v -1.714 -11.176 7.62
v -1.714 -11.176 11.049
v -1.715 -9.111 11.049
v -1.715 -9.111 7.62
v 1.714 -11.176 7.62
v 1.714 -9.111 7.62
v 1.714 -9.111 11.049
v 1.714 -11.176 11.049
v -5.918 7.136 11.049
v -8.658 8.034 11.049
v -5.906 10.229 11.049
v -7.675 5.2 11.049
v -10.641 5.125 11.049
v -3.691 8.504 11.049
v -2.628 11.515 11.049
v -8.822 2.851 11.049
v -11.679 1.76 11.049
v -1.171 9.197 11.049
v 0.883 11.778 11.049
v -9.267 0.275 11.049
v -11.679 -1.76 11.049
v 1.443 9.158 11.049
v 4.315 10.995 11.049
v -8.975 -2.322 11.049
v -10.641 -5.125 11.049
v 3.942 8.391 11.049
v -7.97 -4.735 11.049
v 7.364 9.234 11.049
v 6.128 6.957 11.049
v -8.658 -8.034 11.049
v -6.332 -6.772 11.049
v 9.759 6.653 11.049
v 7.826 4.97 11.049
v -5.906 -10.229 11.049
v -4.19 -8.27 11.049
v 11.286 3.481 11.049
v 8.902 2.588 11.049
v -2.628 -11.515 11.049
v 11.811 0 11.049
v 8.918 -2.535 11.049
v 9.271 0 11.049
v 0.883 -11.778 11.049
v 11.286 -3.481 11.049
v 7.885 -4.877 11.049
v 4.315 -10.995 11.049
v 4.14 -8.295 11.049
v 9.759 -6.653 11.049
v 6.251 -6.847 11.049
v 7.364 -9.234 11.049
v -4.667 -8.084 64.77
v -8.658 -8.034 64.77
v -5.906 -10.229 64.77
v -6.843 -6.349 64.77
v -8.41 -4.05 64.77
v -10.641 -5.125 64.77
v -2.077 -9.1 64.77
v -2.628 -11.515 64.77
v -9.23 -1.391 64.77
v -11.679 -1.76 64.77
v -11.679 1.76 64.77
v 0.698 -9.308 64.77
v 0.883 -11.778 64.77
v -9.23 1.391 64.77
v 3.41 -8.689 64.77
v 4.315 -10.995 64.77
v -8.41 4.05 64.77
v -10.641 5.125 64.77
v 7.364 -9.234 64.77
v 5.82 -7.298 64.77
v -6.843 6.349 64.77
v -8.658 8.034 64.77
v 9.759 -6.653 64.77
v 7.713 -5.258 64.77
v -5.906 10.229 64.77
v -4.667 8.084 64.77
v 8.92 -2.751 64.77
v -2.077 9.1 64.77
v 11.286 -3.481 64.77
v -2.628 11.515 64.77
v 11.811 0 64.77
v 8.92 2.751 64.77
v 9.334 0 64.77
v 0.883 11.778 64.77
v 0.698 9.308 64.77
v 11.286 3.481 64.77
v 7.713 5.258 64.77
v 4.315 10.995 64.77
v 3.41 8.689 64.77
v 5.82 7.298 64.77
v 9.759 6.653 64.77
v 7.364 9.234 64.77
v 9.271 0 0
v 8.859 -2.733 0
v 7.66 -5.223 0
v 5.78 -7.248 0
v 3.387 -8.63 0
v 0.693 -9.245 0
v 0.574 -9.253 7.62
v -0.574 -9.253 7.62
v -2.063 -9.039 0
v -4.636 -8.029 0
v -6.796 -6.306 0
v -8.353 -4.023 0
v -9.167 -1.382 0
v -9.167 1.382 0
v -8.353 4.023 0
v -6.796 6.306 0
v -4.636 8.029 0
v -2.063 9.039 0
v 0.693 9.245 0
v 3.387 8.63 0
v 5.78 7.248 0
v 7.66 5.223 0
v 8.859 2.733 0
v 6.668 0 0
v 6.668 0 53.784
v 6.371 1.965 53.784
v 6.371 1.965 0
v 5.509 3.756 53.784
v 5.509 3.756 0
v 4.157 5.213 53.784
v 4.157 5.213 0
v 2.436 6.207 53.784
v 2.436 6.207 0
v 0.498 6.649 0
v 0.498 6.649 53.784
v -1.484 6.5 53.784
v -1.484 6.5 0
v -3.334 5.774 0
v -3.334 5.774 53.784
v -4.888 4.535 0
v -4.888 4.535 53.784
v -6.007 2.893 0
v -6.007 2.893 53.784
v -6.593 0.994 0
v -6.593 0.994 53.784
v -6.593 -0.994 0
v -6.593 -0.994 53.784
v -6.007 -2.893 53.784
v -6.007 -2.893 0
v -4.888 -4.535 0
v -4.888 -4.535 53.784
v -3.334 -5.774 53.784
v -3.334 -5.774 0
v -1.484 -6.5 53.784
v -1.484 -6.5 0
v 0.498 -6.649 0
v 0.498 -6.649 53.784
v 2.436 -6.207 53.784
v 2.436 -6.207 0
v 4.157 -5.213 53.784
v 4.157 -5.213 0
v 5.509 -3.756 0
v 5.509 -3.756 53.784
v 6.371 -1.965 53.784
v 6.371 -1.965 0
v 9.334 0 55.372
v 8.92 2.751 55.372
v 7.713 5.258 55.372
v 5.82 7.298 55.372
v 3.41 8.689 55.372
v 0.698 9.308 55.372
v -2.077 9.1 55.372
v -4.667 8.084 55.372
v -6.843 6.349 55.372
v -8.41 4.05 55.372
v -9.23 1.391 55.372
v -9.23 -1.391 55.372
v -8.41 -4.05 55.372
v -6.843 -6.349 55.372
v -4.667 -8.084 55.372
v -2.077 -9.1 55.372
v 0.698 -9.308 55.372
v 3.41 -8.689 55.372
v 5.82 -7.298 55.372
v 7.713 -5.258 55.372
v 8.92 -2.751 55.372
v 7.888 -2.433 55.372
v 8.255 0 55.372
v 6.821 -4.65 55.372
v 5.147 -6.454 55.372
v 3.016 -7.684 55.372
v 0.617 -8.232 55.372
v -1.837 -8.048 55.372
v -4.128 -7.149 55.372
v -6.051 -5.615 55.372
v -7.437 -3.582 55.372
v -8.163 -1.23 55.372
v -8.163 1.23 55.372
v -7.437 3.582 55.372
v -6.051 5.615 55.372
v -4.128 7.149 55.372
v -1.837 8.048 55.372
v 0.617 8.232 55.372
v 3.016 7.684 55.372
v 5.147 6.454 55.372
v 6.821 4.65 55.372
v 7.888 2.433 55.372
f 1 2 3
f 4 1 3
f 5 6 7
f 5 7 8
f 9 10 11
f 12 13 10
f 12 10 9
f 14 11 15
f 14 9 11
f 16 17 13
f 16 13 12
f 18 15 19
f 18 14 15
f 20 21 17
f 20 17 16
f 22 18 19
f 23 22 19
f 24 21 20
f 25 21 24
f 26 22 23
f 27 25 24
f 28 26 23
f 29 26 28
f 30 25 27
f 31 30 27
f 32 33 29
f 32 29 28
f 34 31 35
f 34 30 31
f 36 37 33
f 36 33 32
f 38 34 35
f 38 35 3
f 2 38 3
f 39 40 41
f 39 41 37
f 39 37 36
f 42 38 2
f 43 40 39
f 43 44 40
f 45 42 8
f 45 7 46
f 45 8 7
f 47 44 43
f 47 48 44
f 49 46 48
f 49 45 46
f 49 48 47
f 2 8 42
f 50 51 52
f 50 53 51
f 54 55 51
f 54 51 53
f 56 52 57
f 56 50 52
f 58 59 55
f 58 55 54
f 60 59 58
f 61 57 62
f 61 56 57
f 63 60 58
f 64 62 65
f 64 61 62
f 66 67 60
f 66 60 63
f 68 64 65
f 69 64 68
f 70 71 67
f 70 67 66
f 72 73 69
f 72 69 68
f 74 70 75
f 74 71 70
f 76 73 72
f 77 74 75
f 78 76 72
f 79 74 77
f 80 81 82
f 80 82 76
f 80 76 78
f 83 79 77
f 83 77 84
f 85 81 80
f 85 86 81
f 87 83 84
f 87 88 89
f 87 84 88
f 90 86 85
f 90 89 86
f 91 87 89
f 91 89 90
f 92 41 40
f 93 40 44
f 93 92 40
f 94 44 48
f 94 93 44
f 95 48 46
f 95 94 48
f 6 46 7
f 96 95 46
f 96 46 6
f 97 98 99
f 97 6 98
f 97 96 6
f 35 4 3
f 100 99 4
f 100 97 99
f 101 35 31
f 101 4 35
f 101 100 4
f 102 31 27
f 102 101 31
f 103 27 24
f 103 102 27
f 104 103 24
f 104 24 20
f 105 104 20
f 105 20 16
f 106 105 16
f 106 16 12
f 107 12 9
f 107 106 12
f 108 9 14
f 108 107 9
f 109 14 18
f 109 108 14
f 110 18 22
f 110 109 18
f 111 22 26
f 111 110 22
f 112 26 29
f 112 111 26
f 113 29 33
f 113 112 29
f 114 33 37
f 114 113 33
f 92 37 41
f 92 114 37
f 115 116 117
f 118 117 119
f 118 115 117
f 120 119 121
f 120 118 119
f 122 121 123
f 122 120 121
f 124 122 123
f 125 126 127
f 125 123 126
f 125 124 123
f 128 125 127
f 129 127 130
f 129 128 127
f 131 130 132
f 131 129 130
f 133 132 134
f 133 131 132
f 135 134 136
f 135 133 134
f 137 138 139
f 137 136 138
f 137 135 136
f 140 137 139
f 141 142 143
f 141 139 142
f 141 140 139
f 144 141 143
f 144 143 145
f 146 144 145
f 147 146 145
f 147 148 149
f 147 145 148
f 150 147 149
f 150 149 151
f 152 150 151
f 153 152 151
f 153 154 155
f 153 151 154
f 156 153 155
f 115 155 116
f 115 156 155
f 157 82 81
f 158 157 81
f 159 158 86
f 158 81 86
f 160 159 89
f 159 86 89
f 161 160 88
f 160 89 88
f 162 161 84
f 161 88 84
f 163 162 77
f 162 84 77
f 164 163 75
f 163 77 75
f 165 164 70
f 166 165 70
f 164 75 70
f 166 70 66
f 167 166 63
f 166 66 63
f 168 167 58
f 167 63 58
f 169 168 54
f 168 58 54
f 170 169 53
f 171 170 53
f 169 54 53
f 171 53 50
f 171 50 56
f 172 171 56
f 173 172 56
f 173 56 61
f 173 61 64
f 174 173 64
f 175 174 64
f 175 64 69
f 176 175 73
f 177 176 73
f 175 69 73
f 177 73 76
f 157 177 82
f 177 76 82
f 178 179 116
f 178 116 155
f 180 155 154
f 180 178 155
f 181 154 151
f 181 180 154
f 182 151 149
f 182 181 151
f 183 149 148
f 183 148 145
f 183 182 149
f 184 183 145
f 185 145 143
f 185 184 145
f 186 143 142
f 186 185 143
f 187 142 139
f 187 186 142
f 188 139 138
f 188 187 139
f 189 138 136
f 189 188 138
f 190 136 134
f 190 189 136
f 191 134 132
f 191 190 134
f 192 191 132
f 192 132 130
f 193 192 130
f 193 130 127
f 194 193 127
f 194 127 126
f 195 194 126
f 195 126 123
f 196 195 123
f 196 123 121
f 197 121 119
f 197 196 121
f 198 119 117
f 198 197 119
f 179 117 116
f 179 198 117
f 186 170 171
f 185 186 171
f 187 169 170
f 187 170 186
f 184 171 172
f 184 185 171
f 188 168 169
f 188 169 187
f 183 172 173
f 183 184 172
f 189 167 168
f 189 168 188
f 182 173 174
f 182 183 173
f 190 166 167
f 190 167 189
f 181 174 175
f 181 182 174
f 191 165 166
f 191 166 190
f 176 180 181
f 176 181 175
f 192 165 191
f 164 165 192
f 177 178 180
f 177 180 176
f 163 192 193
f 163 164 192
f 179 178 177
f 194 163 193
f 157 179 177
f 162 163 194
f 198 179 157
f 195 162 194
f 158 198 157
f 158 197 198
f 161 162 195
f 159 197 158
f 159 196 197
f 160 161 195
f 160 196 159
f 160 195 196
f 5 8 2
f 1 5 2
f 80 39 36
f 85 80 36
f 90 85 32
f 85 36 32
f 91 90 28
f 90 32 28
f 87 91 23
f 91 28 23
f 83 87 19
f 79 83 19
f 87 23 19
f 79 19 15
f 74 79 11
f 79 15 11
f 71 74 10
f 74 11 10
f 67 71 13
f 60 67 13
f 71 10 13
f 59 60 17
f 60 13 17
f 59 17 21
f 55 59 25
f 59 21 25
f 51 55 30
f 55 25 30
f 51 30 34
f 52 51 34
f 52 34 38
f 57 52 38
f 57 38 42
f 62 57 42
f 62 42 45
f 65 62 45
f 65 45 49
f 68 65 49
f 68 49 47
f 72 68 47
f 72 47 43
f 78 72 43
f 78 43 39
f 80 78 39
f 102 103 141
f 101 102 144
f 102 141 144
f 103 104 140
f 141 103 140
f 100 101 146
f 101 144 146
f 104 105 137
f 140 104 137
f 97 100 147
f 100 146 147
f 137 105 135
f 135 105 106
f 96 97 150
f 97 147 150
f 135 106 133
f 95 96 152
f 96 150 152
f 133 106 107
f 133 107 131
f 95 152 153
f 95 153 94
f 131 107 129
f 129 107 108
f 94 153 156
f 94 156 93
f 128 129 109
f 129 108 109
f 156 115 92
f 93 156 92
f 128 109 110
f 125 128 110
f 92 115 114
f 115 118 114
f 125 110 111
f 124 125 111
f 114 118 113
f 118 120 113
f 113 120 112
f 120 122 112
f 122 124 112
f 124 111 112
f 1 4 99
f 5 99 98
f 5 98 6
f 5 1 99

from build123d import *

# Parameters (mm, degrees)
F0_R     = 11.811
F0_R_2   = 6.6675
F1_DEPTH = 64.77
F2_R     = 9.271
F2_R_2   = 6.6675
F2_R_3   = 11.811
F3_DEPTH = 11.049
F5_DEPTH = 3.429
F6_R     = 9.3345
F7_DEPTH = 9.398
F8_SIZE  = 1.5875


with BuildPart() as f1:
    # F0 (on Top) → F1 (new body)
    with BuildSketch(Plane.XY):
        Circle(F0_R)
        Circle(F0_R_2, mode=Mode.SUBTRACT)
    extrude(amount=F1_DEPTH)

    # F2 (on face) → F3 (cut)
    with BuildSketch(Plane(origin=(0, 0, 0), x_dir=(1, 0, 0), z_dir=(0, 0, -1))):
        Circle(F2_R)
        Circle(F2_R_2, mode=Mode.SUBTRACT)
        Circle(F2_R_3)
        Circle(F2_R, mode=Mode.SUBTRACT)
    extrude(amount=-F3_DEPTH, mode=Mode.SUBTRACT)

    # F4 (on face) → F5 (join)
    with BuildSketch(Plane(origin=(0, 0, 11.049), x_dir=(1, 0, 0), z_dir=(0, 0, -1))):
        with BuildLine():
            Line((1.7145, 11.176), (-1.7145, 11.176))
            Line((-1.7145, 11.176), (-1.7145, 9.111088))
            ThreePointArc((-1.7145, 9.111088), (0, 9.271), (1.7145, 9.111088))
            Line((1.7145, 9.111088), (1.7145, 11.176))
        make_face()
    extrude(amount=F5_DEPTH)

    # F6 (on face) → F7 (cut)
    with BuildSketch(Plane.XY.offset(64.77)):
        Circle(F6_R)
    extrude(amount=-F7_DEPTH, mode=Mode.SUBTRACT)

    # F8
    f8_edges = [f1.edges().sort_by_distance(p)[0] for p in [
        (-6.6675, 0, 55.372),
    ]]
    chamfer(f8_edges, length=F8_SIZE)


solid = f1.part
